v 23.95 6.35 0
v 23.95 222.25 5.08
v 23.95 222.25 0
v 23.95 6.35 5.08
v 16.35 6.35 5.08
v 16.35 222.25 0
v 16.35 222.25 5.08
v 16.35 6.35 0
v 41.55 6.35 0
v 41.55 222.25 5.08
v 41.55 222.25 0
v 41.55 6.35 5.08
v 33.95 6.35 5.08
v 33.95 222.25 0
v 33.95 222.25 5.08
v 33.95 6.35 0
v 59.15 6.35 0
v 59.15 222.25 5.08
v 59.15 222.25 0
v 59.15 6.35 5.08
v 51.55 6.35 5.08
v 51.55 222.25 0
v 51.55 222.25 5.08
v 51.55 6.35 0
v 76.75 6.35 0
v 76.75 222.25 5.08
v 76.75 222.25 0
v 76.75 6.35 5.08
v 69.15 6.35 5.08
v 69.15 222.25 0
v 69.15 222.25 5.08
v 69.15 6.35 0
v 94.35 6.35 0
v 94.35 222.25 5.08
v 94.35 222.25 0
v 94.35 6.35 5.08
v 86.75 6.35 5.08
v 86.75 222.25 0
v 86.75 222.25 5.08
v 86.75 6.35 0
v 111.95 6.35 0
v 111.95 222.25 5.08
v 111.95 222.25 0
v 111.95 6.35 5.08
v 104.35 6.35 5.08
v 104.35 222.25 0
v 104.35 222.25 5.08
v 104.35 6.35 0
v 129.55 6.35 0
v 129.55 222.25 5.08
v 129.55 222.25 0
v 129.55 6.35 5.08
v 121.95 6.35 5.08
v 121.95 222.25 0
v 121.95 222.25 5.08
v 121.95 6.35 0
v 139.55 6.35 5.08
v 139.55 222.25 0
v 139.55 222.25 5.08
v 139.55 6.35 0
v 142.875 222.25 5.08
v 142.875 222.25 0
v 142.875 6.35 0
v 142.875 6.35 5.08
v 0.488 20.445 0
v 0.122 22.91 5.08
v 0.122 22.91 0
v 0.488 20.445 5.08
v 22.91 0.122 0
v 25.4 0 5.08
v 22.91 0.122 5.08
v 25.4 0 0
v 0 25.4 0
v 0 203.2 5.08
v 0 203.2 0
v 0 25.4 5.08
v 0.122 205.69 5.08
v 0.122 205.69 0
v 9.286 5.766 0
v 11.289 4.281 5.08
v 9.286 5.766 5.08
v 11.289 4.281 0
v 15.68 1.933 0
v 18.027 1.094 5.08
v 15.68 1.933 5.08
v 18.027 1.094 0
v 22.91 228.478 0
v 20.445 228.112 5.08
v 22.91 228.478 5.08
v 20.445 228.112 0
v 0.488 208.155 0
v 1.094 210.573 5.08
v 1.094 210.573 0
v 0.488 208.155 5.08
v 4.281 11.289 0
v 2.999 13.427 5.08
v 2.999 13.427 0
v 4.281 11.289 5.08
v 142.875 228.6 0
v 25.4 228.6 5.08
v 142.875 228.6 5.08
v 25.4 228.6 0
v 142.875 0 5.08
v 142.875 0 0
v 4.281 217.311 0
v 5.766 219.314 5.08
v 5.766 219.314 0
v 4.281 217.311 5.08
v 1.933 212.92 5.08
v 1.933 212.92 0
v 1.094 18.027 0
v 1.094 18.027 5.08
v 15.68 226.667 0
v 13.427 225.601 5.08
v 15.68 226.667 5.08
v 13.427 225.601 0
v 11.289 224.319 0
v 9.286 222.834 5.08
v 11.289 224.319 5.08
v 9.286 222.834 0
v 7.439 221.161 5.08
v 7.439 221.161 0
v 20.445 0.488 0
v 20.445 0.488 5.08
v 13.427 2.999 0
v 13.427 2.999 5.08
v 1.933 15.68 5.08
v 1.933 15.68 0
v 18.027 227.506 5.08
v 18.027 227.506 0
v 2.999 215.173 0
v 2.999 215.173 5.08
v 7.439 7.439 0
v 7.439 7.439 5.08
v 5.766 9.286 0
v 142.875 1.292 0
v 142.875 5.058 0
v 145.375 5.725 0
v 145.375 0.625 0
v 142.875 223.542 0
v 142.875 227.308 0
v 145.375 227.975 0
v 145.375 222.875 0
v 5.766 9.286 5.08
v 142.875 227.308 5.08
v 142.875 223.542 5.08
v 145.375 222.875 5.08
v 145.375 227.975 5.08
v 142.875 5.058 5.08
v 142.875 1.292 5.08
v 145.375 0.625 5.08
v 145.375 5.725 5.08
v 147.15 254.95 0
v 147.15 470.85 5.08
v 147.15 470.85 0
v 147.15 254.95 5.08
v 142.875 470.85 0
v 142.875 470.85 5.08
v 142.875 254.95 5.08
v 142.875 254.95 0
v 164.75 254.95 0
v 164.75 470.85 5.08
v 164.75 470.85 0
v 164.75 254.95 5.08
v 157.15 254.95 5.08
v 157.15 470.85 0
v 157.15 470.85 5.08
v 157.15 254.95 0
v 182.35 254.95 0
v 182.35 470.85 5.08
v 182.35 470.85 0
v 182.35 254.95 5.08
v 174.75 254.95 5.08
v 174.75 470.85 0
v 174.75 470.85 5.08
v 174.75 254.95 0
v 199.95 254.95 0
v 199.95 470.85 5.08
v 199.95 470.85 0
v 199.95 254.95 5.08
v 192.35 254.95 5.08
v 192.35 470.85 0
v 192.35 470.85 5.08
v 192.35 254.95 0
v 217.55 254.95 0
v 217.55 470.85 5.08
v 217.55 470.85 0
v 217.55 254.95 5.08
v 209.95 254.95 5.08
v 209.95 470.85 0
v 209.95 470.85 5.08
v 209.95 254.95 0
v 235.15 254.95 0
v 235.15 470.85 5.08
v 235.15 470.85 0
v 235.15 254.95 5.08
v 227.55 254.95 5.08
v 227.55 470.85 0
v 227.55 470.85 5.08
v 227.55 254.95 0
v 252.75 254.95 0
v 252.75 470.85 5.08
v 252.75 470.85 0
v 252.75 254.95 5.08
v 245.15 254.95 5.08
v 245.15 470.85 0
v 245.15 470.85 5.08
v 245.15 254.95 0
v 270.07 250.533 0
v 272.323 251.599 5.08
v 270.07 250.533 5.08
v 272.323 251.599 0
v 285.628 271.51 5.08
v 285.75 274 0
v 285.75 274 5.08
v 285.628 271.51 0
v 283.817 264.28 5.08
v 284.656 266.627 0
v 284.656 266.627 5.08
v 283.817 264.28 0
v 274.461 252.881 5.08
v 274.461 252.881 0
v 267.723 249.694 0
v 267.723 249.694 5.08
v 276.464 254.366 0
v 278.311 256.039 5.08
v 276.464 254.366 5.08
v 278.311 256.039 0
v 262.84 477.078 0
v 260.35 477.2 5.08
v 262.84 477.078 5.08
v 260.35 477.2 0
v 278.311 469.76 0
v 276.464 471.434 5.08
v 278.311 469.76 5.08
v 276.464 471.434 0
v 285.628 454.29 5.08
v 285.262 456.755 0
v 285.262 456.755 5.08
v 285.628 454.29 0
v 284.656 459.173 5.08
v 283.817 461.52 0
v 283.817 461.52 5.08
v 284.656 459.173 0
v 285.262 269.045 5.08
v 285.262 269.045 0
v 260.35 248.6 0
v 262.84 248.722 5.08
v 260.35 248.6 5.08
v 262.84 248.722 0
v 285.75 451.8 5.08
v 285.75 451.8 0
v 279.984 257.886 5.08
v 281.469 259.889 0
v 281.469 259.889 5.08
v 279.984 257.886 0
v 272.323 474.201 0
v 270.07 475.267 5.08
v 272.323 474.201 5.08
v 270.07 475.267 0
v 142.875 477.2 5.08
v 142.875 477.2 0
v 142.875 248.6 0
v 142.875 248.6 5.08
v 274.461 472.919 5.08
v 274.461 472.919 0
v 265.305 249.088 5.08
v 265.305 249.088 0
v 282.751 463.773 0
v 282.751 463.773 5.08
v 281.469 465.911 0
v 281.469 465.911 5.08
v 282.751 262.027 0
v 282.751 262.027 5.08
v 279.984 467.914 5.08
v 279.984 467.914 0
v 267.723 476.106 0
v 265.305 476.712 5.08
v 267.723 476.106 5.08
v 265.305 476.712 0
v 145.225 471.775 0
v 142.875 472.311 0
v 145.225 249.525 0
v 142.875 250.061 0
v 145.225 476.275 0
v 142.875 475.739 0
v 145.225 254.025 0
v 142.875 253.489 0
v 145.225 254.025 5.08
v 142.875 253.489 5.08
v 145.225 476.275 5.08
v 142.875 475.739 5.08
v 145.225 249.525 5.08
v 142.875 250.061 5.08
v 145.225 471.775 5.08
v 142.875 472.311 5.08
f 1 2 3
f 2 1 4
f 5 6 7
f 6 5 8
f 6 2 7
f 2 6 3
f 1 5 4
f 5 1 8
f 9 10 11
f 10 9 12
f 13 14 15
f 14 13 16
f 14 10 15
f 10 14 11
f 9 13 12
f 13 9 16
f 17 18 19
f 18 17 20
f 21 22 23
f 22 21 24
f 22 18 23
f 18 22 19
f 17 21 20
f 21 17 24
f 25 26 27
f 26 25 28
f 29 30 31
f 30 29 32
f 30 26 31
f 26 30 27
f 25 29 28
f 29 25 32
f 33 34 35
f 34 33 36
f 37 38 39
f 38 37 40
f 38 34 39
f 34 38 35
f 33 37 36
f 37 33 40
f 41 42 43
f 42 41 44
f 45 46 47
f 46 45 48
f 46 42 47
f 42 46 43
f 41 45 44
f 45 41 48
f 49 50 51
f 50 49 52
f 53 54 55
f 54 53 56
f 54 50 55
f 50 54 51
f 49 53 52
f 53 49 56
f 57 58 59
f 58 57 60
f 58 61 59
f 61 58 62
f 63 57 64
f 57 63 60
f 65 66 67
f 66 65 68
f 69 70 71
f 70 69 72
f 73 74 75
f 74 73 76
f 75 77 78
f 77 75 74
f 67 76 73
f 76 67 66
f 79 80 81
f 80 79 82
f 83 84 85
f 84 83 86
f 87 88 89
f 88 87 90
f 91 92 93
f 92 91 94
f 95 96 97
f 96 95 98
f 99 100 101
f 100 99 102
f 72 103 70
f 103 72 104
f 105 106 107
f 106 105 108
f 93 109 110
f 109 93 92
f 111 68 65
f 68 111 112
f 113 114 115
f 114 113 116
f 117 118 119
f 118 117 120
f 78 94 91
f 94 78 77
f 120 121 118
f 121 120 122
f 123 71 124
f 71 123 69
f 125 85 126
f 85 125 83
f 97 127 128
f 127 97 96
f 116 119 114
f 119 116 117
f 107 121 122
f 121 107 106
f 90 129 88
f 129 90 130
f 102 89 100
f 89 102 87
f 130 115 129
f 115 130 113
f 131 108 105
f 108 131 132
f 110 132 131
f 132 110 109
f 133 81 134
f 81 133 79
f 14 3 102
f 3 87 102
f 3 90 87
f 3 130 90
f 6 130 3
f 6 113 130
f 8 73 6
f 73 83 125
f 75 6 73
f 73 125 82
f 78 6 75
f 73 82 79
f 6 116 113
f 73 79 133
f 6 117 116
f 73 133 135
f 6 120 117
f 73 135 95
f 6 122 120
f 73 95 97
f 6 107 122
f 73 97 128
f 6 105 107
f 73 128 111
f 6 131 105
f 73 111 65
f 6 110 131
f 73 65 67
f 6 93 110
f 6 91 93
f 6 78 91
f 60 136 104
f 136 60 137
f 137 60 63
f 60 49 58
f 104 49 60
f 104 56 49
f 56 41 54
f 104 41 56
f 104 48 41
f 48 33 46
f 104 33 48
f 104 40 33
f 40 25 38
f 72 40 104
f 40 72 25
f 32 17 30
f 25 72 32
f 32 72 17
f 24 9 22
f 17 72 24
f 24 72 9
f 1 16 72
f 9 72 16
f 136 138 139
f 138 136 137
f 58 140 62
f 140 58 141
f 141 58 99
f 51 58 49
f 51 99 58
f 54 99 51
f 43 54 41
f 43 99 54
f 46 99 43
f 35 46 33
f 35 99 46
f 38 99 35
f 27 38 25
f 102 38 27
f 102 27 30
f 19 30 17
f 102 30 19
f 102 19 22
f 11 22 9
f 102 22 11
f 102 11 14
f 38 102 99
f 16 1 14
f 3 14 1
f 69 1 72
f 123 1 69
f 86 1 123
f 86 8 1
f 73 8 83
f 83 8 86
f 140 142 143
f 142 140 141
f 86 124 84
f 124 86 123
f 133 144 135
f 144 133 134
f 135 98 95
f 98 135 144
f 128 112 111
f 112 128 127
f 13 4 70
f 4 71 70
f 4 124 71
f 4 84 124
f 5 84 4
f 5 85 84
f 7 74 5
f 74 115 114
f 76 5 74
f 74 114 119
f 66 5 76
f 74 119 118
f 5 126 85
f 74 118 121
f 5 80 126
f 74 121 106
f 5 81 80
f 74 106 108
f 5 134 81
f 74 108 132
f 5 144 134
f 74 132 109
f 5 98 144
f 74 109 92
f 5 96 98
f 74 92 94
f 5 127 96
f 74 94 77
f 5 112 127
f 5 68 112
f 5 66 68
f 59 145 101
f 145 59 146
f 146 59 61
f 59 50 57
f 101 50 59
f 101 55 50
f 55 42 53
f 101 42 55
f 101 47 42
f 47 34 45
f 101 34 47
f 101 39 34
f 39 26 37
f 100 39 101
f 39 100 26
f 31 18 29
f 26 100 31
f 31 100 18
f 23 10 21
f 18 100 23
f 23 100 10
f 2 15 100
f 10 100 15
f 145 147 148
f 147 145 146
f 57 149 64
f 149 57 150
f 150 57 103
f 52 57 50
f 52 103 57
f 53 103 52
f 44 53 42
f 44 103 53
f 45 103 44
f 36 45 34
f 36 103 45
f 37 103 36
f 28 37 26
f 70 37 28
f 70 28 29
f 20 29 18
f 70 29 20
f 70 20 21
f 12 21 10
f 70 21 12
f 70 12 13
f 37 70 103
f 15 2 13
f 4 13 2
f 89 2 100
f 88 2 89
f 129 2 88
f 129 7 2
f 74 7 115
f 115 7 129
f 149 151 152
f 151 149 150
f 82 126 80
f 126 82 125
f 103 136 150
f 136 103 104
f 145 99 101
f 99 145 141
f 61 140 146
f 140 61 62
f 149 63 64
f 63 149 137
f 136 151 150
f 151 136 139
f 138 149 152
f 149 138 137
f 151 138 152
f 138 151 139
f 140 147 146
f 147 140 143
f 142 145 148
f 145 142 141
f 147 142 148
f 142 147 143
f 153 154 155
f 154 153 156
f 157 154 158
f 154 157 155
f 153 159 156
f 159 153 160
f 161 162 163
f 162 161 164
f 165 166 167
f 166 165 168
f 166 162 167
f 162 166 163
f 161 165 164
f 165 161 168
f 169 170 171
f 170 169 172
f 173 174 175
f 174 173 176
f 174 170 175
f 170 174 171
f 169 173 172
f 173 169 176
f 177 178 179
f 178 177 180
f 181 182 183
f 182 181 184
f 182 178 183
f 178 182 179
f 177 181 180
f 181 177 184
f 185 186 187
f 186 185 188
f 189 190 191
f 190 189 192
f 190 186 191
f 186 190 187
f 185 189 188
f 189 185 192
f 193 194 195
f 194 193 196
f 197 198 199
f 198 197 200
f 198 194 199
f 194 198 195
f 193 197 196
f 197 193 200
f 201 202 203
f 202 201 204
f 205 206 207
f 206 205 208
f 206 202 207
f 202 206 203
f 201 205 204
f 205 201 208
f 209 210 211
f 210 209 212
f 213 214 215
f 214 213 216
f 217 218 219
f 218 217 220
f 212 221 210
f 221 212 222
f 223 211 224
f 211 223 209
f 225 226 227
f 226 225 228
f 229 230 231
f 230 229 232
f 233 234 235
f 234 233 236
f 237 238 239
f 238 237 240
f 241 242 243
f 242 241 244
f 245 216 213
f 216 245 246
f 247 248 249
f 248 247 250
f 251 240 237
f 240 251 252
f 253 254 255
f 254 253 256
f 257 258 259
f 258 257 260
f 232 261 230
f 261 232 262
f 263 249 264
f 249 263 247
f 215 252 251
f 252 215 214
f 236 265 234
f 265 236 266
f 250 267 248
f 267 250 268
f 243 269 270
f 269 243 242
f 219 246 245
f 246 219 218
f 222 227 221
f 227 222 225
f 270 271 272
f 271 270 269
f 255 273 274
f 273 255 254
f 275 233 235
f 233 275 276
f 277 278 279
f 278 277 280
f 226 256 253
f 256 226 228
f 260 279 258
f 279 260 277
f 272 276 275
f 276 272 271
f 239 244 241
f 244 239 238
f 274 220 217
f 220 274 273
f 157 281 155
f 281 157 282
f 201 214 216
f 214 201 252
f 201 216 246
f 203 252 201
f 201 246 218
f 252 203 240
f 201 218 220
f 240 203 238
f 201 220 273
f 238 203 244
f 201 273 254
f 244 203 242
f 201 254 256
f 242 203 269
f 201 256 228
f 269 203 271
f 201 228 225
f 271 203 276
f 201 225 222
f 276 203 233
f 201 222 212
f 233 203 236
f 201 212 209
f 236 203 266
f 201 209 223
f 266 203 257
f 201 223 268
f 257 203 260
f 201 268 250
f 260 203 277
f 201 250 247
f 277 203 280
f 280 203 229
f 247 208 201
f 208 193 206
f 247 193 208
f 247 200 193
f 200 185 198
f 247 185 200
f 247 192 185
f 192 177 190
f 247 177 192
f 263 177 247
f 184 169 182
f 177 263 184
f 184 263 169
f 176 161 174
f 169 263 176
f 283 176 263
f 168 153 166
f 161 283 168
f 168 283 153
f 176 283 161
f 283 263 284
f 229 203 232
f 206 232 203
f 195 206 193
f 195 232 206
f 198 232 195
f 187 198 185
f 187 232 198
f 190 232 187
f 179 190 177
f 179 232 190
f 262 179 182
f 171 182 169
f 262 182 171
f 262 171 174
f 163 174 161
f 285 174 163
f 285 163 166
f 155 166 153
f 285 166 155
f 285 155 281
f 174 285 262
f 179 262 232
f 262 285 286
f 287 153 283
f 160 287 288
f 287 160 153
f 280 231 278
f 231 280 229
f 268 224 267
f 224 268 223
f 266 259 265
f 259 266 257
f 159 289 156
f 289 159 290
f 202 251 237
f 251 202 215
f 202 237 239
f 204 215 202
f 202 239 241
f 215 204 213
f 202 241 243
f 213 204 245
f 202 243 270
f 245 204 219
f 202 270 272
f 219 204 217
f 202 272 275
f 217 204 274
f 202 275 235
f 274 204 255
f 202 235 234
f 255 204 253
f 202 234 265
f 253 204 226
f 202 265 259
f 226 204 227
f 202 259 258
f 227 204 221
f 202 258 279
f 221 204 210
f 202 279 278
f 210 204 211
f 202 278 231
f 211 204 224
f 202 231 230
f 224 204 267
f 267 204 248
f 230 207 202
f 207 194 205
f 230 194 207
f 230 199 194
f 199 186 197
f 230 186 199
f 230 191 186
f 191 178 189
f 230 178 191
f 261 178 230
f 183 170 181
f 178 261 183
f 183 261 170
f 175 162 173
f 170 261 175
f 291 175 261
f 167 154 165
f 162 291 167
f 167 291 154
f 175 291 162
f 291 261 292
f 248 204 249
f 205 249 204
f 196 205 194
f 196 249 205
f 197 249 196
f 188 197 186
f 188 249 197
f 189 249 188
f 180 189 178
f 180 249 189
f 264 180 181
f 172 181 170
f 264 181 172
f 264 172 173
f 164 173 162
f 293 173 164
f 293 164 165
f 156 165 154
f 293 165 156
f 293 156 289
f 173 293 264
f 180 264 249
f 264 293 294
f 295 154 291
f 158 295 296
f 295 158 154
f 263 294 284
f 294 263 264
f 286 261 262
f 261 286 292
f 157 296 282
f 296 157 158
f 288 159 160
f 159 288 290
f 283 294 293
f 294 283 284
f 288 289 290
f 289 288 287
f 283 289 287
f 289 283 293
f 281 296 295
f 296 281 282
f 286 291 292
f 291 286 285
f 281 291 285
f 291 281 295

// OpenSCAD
// file: model-forge/model-forge/tray.scad
// model-forge/tray.scad — rounded-corner outer panel with a recessed
// inset pocket (e.g. a "cooking dish" recess): a raised rim around the
// edge, floor thickness under the pocket, and an optional thin lip
// flange around the base — sized to slide into a support-rail groove
// (like the wooden rails inside the real Tiny Land oven cavity) rather
// than just resting loose.
//
//   use <model-forge/tray.scad>
//   rounded_tray(outer_width=285.75, outer_height=228.6, corner_radius=25.4,
//                floor_thickness=5.08, rim_height=3.81, inset_margin=6.35,
//                lip_width=3, lip_thickness=2);
//
// Shape: outer_width x outer_height slab, rounded corners (corner_radius),
// total height = floor_thickness + rim_height. A pocket is cut from the
// top, inset_margin in from every edge, cutting down through rim_height
// and stopping at floor_thickness from the bottom — so floor_thickness is
// what's left under the pocket, rim_height is how tall the surrounding
// wall stands above the pocket floor.
//
// The lip (lip_width/lip_thickness) is a thin flange at the TOP of the
// rim (from total_height-lip_thickness to total_height), sticking out
// lip_width beyond the main body on every side — corrected 2026-09-11
// per feedback on the real rail photo: the groove is near the top of the
// cavity wall, not the bottom. Both default to 0 (no lip) so existing
// calls keep working unchanged.

// hull-of-4-circles rounded rect — much faster to render than a
// minkowski-based approach for this shape (no minkowski sum needed).
module rounded_rect_2d(w, h, r) {
  hull() {
    translate([r, r]) circle(r = r, $fn = 64);
    translate([w - r, r]) circle(r = r, $fn = 64);
    translate([r, h - r]) circle(r = r, $fn = 64);
    translate([w - r, h - r]) circle(r = r, $fn = 64);
  }
}

module rounded_tray(
  outer_width,
  outer_height,
  corner_radius,
  floor_thickness,
  rim_height,
  inset_margin,
  lip_width = 0,
  lip_thickness = 0
) {
  total_height = floor_thickness + rim_height;

  union() {
    if (lip_width > 0 && lip_thickness > 0) {
      translate([-lip_width, -lip_width, total_height - lip_thickness])
        linear_extrude(height = lip_thickness)
          rounded_rect_2d(outer_width + 2 * lip_width, outer_height + 2 * lip_width, corner_radius + lip_width);
    }
    difference() {
      linear_extrude(height = total_height)
        rounded_rect_2d(outer_width, outer_height, corner_radius);
      translate([inset_margin, inset_margin, floor_thickness])
        cube([outer_width - 2 * inset_margin, outer_height - 2 * inset_margin, rim_height + 1]);
    }
  }
}
// file: model-forge/joint.scad
// model-forge/joint.scad — dovetail finger-joint tabs for snap-fit panel
// segmentation. One segment gets protruding tabs (union onto its edge),
// the matching segment gets slightly-larger slots (difference cut into
// its edge) so the two press together with a light interference/snap fit.
//
// Both modules produce a 2D profile running along the X axis, centered
// on the boundary line (y=0), for a boundary of the given edge_length.
// The caller extrudes and positions/rotates it onto the actual seam
// (see back-wall-joint-test.scad for a worked example on a vertical seam).
//
//   use <model-forge/joint.scad>
//   linear_extrude(height=thickness)
//     dovetail_tabs_2d(edge_length=60, tab_width=15, tab_depth=6, taper=2);
//   // on the MATING piece, subtract:
//   linear_extrude(height=thickness+2)
//     dovetail_tabs_2d(edge_length=60, tab_width=15, tab_depth=6, taper=2, clearance=0.15);

module dovetail_tab_2d(tab_width, tab_depth, taper, base_overlap = 0.5) {
  // Trapezoid: narrow at the base, wider at the tip (y=tab_depth) — the
  // taper is what makes it a dovetail (can't pull straight out sideways
  // once the mating slot is filled) and gives the snap/interference feel
  // as it's pressed in along Y. The base extends base_overlap PAST y=0
  // (the seam line) on purpose: a cut/union placed exactly flush with a
  // piece's boundary face (zero overlap) is a classic OpenSCAD/CGAL
  // gotcha — coincident faces produce degenerate, non-manifold results
  // (confirmed here: without the overlap this rendered as a distorted
  // sliver instead of a clean notch). The overlap guarantees real overlap
  // for both the union (tab) and difference (slot) uses.
  polygon(points = [
    [-tab_width / 2, -base_overlap],
    [tab_width / 2, -base_overlap],
    [tab_width / 2 + taper, tab_depth],
    [-tab_width / 2 - taper, tab_depth],
  ]);
}

/**
 * A row of dovetail tabs spanning edge_length, evenly spaced and centered,
 * each tab_width wide with tab_depth of protrusion and the given taper.
 * Pass clearance > 0 (e.g. 0.15-0.2mm) when using this as a SLOT cutout on
 * the mating piece, so the tab has just enough room to press in.
 */
module dovetail_tabs_2d(edge_length, tab_width, tab_depth, taper, clearance = 0) {
  // Growing the slot via offset(delta=clearance) produced a disconnected
  // sliver fragment at the corner (confirmed with --render: 3 volumes
  // instead of 2, a known OpenSCAD quirk with delta-mode offset on a
  // trapezoid). Scaling the tab's own dimensions directly instead avoids
  // offset() entirely and renders as the expected 2 volumes.
  pitch = tab_width * 2;
  n = max(1, floor(edge_length / pitch));
  row_width = n * pitch - tab_width;
  start_x = -row_width / 2;
  for (i = [0 : n - 1]) {
    translate([start_x + i * pitch, 0])
      dovetail_tab_2d(tab_width + 2 * clearance, tab_depth + clearance, taper + clearance);
  }
}
// file: model-forge/grate.scad
// model-forge/grate.scad — rounded-corner panel cut into an oven-rack-
// style bar grate: a solid frame border, parallel bars across the
// interior with open gaps between them.
//
//   use <model-forge/grate.scad>
//   oven_grate(outer_width=285.75, outer_height=228.6, corner_radius=25.4,
//              thickness=5.08, frame_width=6.35, bar_width=10, gap_width=7.6);
//
// Bars run parallel to the height (vertical bars spanning the width),
// starting and ending with a solid bar against the frame — real oven
// racks don't have a gap right at the edge. Spacing is pitch-based
// (bar_width + gap_width repeating); it won't divide the interior
// perfectly evenly on every size, so the last bar absorbs any leftover
// width. Tune bar_width/gap_width and re-render if that's visible.
use <model-forge/tray.scad> // rounded_rect_2d

module oven_grate(outer_width, outer_height, corner_radius, thickness, frame_width, bar_width, gap_width) {
  inner_width = outer_width - 2 * frame_width;
  inner_height = outer_height - 2 * frame_width;
  pitch = bar_width + gap_width;
  n_gaps = floor((inner_width - bar_width) / pitch);

  difference() {
    linear_extrude(height = thickness)
      rounded_rect_2d(outer_width, outer_height, corner_radius);
    for (i = [0 : n_gaps - 1]) {
      x = frame_width + bar_width + i * pitch;
      translate([x, frame_width, -1])
        cube([gap_width, inner_height, thickness + 2]);
    }
  }
}
// main file
// Tiny Land oven insert — grate, split into 2 printable halves.
//
// The grate's own footprint (311mm incl. the lip flare) only exceeds
// the 256mm bed on the X axis, so ONE cut is enough — no 2x2 grid like
// the back wall needs. The cut sits at outer_width/2 (142.875mm), which
// lands exactly in the gap between bar 8 and bar 9 of the bar pattern
// (verified against the grate's own auto-fit bar/gap math: bars run
// 10mm on a 17.537mm pitch, and that pitch happens to put a gap right
// at the panel's center). So NEITHER half needs to touch a structural
// bar — every bar stays fully intact inside one half or the other. The
// only things that actually cross the seam are the continuous top and
// bottom frame border strips (each only frame_width_mm=6.35mm tall),
// so that's the only place a joint goes: one small dovetail per strip,
// not a full tab row like the wall's — "alternating small ends into
// larger hollow ends," same principle, scaled down to fit inside a
// 6.35mm-tall strip on a 5.08mm-thick panel.
//
// joint_clearance below is a PLACEHOLDER pending dovetail-fit-test.scad's
// physical result — replace it with whichever slot on that comb actually
// snapped/held once it's been tested, then re-render.
use <model-forge/grate.scad>
use <model-forge/joint.scad>

/* [Size — inches, matches oven-grate.scad] */
outer_width_in  = 11.25;
outer_height_in = 9;
corner_radius_in = 1;

/* [Bars] */
thickness_mm   = 5.08;
frame_width_mm = 6.35;
bar_width_mm   = 10;
gap_width_mm   = 7.6;

/* [Lip] */
lip_width_in     = 0.12;
end_lip_width_in = 0.5;
lip_thickness_mm = 2.5;

/* [Joint — placeholder, tune from dovetail-fit-test.scad] */
joint_clearance = -0.15; // PLACEHOLDER — swap for the tested winning value
joint_tab_width = 3.5;   // scaled down to fit inside the 6.35mm frame band
joint_tab_depth = 2.5;
joint_taper     = 0.8;

IN_TO_MM = 25.4;
outer_w = outer_width_in * IN_TO_MM;
outer_h = outer_height_in * IN_TO_MM;
cut_x = outer_w / 2; // lands in the bar8/bar9 gap — see header comment
BIG = 1000;

module full_grate() {
  oven_grate(
    outer_width   = outer_w,
    outer_height  = outer_h,
    corner_radius = corner_radius_in * IN_TO_MM,
    thickness     = thickness_mm,
    frame_width   = frame_width_mm,
    bar_width     = bar_width_mm,
    gap_width     = gap_width_mm,
    lip_width     = lip_width_in * IN_TO_MM,
    end_lip_width = end_lip_width_in * IN_TO_MM,
    lip_thickness = lip_thickness_mm
  );
}

// One small dovetail, on the seam line, centered on a frame band.
// Same orientation trick as joint.scad's own worked example: rotate
// -90 so the tab/slot protrudes further +X from a right-facing edge.
module frame_band_tab(y_center) {
  translate([cut_x, y_center, 0])
    rotate([0, 0, -90])
      linear_extrude(height = thickness_mm)
        dovetail_tab_2d(joint_tab_width, joint_tab_depth, joint_taper);
}

module frame_band_slot(y_center) {
  translate([cut_x, y_center, -1])
    rotate([0, 0, -90])
      linear_extrude(height = thickness_mm + 2)
        dovetail_tab_2d(
          joint_tab_width + 2 * joint_clearance,
          joint_tab_depth + joint_clearance,
          joint_taper + joint_clearance
        );
}

module half_A() {
  union() {
    intersection() {
      full_grate();
      translate([-BIG, -BIG, -1])
        cube([BIG + cut_x, outer_h + 2 * BIG, thickness_mm + 2]);
    }
    frame_band_tab(frame_width_mm / 2);
    frame_band_tab(outer_h - frame_width_mm / 2);
  }
}

module half_B() {
  difference() {
    intersection() {
      full_grate();
      translate([cut_x, -BIG, -1])
        cube([BIG + (outer_w - cut_x), outer_h + 2 * BIG, thickness_mm + 2]);
    }
    frame_band_slot(frame_width_mm / 2);
    frame_band_slot(outer_h - frame_width_mm / 2);
  }
}

half_A();
translate([0, outer_h + 20, 0]) half_B();
